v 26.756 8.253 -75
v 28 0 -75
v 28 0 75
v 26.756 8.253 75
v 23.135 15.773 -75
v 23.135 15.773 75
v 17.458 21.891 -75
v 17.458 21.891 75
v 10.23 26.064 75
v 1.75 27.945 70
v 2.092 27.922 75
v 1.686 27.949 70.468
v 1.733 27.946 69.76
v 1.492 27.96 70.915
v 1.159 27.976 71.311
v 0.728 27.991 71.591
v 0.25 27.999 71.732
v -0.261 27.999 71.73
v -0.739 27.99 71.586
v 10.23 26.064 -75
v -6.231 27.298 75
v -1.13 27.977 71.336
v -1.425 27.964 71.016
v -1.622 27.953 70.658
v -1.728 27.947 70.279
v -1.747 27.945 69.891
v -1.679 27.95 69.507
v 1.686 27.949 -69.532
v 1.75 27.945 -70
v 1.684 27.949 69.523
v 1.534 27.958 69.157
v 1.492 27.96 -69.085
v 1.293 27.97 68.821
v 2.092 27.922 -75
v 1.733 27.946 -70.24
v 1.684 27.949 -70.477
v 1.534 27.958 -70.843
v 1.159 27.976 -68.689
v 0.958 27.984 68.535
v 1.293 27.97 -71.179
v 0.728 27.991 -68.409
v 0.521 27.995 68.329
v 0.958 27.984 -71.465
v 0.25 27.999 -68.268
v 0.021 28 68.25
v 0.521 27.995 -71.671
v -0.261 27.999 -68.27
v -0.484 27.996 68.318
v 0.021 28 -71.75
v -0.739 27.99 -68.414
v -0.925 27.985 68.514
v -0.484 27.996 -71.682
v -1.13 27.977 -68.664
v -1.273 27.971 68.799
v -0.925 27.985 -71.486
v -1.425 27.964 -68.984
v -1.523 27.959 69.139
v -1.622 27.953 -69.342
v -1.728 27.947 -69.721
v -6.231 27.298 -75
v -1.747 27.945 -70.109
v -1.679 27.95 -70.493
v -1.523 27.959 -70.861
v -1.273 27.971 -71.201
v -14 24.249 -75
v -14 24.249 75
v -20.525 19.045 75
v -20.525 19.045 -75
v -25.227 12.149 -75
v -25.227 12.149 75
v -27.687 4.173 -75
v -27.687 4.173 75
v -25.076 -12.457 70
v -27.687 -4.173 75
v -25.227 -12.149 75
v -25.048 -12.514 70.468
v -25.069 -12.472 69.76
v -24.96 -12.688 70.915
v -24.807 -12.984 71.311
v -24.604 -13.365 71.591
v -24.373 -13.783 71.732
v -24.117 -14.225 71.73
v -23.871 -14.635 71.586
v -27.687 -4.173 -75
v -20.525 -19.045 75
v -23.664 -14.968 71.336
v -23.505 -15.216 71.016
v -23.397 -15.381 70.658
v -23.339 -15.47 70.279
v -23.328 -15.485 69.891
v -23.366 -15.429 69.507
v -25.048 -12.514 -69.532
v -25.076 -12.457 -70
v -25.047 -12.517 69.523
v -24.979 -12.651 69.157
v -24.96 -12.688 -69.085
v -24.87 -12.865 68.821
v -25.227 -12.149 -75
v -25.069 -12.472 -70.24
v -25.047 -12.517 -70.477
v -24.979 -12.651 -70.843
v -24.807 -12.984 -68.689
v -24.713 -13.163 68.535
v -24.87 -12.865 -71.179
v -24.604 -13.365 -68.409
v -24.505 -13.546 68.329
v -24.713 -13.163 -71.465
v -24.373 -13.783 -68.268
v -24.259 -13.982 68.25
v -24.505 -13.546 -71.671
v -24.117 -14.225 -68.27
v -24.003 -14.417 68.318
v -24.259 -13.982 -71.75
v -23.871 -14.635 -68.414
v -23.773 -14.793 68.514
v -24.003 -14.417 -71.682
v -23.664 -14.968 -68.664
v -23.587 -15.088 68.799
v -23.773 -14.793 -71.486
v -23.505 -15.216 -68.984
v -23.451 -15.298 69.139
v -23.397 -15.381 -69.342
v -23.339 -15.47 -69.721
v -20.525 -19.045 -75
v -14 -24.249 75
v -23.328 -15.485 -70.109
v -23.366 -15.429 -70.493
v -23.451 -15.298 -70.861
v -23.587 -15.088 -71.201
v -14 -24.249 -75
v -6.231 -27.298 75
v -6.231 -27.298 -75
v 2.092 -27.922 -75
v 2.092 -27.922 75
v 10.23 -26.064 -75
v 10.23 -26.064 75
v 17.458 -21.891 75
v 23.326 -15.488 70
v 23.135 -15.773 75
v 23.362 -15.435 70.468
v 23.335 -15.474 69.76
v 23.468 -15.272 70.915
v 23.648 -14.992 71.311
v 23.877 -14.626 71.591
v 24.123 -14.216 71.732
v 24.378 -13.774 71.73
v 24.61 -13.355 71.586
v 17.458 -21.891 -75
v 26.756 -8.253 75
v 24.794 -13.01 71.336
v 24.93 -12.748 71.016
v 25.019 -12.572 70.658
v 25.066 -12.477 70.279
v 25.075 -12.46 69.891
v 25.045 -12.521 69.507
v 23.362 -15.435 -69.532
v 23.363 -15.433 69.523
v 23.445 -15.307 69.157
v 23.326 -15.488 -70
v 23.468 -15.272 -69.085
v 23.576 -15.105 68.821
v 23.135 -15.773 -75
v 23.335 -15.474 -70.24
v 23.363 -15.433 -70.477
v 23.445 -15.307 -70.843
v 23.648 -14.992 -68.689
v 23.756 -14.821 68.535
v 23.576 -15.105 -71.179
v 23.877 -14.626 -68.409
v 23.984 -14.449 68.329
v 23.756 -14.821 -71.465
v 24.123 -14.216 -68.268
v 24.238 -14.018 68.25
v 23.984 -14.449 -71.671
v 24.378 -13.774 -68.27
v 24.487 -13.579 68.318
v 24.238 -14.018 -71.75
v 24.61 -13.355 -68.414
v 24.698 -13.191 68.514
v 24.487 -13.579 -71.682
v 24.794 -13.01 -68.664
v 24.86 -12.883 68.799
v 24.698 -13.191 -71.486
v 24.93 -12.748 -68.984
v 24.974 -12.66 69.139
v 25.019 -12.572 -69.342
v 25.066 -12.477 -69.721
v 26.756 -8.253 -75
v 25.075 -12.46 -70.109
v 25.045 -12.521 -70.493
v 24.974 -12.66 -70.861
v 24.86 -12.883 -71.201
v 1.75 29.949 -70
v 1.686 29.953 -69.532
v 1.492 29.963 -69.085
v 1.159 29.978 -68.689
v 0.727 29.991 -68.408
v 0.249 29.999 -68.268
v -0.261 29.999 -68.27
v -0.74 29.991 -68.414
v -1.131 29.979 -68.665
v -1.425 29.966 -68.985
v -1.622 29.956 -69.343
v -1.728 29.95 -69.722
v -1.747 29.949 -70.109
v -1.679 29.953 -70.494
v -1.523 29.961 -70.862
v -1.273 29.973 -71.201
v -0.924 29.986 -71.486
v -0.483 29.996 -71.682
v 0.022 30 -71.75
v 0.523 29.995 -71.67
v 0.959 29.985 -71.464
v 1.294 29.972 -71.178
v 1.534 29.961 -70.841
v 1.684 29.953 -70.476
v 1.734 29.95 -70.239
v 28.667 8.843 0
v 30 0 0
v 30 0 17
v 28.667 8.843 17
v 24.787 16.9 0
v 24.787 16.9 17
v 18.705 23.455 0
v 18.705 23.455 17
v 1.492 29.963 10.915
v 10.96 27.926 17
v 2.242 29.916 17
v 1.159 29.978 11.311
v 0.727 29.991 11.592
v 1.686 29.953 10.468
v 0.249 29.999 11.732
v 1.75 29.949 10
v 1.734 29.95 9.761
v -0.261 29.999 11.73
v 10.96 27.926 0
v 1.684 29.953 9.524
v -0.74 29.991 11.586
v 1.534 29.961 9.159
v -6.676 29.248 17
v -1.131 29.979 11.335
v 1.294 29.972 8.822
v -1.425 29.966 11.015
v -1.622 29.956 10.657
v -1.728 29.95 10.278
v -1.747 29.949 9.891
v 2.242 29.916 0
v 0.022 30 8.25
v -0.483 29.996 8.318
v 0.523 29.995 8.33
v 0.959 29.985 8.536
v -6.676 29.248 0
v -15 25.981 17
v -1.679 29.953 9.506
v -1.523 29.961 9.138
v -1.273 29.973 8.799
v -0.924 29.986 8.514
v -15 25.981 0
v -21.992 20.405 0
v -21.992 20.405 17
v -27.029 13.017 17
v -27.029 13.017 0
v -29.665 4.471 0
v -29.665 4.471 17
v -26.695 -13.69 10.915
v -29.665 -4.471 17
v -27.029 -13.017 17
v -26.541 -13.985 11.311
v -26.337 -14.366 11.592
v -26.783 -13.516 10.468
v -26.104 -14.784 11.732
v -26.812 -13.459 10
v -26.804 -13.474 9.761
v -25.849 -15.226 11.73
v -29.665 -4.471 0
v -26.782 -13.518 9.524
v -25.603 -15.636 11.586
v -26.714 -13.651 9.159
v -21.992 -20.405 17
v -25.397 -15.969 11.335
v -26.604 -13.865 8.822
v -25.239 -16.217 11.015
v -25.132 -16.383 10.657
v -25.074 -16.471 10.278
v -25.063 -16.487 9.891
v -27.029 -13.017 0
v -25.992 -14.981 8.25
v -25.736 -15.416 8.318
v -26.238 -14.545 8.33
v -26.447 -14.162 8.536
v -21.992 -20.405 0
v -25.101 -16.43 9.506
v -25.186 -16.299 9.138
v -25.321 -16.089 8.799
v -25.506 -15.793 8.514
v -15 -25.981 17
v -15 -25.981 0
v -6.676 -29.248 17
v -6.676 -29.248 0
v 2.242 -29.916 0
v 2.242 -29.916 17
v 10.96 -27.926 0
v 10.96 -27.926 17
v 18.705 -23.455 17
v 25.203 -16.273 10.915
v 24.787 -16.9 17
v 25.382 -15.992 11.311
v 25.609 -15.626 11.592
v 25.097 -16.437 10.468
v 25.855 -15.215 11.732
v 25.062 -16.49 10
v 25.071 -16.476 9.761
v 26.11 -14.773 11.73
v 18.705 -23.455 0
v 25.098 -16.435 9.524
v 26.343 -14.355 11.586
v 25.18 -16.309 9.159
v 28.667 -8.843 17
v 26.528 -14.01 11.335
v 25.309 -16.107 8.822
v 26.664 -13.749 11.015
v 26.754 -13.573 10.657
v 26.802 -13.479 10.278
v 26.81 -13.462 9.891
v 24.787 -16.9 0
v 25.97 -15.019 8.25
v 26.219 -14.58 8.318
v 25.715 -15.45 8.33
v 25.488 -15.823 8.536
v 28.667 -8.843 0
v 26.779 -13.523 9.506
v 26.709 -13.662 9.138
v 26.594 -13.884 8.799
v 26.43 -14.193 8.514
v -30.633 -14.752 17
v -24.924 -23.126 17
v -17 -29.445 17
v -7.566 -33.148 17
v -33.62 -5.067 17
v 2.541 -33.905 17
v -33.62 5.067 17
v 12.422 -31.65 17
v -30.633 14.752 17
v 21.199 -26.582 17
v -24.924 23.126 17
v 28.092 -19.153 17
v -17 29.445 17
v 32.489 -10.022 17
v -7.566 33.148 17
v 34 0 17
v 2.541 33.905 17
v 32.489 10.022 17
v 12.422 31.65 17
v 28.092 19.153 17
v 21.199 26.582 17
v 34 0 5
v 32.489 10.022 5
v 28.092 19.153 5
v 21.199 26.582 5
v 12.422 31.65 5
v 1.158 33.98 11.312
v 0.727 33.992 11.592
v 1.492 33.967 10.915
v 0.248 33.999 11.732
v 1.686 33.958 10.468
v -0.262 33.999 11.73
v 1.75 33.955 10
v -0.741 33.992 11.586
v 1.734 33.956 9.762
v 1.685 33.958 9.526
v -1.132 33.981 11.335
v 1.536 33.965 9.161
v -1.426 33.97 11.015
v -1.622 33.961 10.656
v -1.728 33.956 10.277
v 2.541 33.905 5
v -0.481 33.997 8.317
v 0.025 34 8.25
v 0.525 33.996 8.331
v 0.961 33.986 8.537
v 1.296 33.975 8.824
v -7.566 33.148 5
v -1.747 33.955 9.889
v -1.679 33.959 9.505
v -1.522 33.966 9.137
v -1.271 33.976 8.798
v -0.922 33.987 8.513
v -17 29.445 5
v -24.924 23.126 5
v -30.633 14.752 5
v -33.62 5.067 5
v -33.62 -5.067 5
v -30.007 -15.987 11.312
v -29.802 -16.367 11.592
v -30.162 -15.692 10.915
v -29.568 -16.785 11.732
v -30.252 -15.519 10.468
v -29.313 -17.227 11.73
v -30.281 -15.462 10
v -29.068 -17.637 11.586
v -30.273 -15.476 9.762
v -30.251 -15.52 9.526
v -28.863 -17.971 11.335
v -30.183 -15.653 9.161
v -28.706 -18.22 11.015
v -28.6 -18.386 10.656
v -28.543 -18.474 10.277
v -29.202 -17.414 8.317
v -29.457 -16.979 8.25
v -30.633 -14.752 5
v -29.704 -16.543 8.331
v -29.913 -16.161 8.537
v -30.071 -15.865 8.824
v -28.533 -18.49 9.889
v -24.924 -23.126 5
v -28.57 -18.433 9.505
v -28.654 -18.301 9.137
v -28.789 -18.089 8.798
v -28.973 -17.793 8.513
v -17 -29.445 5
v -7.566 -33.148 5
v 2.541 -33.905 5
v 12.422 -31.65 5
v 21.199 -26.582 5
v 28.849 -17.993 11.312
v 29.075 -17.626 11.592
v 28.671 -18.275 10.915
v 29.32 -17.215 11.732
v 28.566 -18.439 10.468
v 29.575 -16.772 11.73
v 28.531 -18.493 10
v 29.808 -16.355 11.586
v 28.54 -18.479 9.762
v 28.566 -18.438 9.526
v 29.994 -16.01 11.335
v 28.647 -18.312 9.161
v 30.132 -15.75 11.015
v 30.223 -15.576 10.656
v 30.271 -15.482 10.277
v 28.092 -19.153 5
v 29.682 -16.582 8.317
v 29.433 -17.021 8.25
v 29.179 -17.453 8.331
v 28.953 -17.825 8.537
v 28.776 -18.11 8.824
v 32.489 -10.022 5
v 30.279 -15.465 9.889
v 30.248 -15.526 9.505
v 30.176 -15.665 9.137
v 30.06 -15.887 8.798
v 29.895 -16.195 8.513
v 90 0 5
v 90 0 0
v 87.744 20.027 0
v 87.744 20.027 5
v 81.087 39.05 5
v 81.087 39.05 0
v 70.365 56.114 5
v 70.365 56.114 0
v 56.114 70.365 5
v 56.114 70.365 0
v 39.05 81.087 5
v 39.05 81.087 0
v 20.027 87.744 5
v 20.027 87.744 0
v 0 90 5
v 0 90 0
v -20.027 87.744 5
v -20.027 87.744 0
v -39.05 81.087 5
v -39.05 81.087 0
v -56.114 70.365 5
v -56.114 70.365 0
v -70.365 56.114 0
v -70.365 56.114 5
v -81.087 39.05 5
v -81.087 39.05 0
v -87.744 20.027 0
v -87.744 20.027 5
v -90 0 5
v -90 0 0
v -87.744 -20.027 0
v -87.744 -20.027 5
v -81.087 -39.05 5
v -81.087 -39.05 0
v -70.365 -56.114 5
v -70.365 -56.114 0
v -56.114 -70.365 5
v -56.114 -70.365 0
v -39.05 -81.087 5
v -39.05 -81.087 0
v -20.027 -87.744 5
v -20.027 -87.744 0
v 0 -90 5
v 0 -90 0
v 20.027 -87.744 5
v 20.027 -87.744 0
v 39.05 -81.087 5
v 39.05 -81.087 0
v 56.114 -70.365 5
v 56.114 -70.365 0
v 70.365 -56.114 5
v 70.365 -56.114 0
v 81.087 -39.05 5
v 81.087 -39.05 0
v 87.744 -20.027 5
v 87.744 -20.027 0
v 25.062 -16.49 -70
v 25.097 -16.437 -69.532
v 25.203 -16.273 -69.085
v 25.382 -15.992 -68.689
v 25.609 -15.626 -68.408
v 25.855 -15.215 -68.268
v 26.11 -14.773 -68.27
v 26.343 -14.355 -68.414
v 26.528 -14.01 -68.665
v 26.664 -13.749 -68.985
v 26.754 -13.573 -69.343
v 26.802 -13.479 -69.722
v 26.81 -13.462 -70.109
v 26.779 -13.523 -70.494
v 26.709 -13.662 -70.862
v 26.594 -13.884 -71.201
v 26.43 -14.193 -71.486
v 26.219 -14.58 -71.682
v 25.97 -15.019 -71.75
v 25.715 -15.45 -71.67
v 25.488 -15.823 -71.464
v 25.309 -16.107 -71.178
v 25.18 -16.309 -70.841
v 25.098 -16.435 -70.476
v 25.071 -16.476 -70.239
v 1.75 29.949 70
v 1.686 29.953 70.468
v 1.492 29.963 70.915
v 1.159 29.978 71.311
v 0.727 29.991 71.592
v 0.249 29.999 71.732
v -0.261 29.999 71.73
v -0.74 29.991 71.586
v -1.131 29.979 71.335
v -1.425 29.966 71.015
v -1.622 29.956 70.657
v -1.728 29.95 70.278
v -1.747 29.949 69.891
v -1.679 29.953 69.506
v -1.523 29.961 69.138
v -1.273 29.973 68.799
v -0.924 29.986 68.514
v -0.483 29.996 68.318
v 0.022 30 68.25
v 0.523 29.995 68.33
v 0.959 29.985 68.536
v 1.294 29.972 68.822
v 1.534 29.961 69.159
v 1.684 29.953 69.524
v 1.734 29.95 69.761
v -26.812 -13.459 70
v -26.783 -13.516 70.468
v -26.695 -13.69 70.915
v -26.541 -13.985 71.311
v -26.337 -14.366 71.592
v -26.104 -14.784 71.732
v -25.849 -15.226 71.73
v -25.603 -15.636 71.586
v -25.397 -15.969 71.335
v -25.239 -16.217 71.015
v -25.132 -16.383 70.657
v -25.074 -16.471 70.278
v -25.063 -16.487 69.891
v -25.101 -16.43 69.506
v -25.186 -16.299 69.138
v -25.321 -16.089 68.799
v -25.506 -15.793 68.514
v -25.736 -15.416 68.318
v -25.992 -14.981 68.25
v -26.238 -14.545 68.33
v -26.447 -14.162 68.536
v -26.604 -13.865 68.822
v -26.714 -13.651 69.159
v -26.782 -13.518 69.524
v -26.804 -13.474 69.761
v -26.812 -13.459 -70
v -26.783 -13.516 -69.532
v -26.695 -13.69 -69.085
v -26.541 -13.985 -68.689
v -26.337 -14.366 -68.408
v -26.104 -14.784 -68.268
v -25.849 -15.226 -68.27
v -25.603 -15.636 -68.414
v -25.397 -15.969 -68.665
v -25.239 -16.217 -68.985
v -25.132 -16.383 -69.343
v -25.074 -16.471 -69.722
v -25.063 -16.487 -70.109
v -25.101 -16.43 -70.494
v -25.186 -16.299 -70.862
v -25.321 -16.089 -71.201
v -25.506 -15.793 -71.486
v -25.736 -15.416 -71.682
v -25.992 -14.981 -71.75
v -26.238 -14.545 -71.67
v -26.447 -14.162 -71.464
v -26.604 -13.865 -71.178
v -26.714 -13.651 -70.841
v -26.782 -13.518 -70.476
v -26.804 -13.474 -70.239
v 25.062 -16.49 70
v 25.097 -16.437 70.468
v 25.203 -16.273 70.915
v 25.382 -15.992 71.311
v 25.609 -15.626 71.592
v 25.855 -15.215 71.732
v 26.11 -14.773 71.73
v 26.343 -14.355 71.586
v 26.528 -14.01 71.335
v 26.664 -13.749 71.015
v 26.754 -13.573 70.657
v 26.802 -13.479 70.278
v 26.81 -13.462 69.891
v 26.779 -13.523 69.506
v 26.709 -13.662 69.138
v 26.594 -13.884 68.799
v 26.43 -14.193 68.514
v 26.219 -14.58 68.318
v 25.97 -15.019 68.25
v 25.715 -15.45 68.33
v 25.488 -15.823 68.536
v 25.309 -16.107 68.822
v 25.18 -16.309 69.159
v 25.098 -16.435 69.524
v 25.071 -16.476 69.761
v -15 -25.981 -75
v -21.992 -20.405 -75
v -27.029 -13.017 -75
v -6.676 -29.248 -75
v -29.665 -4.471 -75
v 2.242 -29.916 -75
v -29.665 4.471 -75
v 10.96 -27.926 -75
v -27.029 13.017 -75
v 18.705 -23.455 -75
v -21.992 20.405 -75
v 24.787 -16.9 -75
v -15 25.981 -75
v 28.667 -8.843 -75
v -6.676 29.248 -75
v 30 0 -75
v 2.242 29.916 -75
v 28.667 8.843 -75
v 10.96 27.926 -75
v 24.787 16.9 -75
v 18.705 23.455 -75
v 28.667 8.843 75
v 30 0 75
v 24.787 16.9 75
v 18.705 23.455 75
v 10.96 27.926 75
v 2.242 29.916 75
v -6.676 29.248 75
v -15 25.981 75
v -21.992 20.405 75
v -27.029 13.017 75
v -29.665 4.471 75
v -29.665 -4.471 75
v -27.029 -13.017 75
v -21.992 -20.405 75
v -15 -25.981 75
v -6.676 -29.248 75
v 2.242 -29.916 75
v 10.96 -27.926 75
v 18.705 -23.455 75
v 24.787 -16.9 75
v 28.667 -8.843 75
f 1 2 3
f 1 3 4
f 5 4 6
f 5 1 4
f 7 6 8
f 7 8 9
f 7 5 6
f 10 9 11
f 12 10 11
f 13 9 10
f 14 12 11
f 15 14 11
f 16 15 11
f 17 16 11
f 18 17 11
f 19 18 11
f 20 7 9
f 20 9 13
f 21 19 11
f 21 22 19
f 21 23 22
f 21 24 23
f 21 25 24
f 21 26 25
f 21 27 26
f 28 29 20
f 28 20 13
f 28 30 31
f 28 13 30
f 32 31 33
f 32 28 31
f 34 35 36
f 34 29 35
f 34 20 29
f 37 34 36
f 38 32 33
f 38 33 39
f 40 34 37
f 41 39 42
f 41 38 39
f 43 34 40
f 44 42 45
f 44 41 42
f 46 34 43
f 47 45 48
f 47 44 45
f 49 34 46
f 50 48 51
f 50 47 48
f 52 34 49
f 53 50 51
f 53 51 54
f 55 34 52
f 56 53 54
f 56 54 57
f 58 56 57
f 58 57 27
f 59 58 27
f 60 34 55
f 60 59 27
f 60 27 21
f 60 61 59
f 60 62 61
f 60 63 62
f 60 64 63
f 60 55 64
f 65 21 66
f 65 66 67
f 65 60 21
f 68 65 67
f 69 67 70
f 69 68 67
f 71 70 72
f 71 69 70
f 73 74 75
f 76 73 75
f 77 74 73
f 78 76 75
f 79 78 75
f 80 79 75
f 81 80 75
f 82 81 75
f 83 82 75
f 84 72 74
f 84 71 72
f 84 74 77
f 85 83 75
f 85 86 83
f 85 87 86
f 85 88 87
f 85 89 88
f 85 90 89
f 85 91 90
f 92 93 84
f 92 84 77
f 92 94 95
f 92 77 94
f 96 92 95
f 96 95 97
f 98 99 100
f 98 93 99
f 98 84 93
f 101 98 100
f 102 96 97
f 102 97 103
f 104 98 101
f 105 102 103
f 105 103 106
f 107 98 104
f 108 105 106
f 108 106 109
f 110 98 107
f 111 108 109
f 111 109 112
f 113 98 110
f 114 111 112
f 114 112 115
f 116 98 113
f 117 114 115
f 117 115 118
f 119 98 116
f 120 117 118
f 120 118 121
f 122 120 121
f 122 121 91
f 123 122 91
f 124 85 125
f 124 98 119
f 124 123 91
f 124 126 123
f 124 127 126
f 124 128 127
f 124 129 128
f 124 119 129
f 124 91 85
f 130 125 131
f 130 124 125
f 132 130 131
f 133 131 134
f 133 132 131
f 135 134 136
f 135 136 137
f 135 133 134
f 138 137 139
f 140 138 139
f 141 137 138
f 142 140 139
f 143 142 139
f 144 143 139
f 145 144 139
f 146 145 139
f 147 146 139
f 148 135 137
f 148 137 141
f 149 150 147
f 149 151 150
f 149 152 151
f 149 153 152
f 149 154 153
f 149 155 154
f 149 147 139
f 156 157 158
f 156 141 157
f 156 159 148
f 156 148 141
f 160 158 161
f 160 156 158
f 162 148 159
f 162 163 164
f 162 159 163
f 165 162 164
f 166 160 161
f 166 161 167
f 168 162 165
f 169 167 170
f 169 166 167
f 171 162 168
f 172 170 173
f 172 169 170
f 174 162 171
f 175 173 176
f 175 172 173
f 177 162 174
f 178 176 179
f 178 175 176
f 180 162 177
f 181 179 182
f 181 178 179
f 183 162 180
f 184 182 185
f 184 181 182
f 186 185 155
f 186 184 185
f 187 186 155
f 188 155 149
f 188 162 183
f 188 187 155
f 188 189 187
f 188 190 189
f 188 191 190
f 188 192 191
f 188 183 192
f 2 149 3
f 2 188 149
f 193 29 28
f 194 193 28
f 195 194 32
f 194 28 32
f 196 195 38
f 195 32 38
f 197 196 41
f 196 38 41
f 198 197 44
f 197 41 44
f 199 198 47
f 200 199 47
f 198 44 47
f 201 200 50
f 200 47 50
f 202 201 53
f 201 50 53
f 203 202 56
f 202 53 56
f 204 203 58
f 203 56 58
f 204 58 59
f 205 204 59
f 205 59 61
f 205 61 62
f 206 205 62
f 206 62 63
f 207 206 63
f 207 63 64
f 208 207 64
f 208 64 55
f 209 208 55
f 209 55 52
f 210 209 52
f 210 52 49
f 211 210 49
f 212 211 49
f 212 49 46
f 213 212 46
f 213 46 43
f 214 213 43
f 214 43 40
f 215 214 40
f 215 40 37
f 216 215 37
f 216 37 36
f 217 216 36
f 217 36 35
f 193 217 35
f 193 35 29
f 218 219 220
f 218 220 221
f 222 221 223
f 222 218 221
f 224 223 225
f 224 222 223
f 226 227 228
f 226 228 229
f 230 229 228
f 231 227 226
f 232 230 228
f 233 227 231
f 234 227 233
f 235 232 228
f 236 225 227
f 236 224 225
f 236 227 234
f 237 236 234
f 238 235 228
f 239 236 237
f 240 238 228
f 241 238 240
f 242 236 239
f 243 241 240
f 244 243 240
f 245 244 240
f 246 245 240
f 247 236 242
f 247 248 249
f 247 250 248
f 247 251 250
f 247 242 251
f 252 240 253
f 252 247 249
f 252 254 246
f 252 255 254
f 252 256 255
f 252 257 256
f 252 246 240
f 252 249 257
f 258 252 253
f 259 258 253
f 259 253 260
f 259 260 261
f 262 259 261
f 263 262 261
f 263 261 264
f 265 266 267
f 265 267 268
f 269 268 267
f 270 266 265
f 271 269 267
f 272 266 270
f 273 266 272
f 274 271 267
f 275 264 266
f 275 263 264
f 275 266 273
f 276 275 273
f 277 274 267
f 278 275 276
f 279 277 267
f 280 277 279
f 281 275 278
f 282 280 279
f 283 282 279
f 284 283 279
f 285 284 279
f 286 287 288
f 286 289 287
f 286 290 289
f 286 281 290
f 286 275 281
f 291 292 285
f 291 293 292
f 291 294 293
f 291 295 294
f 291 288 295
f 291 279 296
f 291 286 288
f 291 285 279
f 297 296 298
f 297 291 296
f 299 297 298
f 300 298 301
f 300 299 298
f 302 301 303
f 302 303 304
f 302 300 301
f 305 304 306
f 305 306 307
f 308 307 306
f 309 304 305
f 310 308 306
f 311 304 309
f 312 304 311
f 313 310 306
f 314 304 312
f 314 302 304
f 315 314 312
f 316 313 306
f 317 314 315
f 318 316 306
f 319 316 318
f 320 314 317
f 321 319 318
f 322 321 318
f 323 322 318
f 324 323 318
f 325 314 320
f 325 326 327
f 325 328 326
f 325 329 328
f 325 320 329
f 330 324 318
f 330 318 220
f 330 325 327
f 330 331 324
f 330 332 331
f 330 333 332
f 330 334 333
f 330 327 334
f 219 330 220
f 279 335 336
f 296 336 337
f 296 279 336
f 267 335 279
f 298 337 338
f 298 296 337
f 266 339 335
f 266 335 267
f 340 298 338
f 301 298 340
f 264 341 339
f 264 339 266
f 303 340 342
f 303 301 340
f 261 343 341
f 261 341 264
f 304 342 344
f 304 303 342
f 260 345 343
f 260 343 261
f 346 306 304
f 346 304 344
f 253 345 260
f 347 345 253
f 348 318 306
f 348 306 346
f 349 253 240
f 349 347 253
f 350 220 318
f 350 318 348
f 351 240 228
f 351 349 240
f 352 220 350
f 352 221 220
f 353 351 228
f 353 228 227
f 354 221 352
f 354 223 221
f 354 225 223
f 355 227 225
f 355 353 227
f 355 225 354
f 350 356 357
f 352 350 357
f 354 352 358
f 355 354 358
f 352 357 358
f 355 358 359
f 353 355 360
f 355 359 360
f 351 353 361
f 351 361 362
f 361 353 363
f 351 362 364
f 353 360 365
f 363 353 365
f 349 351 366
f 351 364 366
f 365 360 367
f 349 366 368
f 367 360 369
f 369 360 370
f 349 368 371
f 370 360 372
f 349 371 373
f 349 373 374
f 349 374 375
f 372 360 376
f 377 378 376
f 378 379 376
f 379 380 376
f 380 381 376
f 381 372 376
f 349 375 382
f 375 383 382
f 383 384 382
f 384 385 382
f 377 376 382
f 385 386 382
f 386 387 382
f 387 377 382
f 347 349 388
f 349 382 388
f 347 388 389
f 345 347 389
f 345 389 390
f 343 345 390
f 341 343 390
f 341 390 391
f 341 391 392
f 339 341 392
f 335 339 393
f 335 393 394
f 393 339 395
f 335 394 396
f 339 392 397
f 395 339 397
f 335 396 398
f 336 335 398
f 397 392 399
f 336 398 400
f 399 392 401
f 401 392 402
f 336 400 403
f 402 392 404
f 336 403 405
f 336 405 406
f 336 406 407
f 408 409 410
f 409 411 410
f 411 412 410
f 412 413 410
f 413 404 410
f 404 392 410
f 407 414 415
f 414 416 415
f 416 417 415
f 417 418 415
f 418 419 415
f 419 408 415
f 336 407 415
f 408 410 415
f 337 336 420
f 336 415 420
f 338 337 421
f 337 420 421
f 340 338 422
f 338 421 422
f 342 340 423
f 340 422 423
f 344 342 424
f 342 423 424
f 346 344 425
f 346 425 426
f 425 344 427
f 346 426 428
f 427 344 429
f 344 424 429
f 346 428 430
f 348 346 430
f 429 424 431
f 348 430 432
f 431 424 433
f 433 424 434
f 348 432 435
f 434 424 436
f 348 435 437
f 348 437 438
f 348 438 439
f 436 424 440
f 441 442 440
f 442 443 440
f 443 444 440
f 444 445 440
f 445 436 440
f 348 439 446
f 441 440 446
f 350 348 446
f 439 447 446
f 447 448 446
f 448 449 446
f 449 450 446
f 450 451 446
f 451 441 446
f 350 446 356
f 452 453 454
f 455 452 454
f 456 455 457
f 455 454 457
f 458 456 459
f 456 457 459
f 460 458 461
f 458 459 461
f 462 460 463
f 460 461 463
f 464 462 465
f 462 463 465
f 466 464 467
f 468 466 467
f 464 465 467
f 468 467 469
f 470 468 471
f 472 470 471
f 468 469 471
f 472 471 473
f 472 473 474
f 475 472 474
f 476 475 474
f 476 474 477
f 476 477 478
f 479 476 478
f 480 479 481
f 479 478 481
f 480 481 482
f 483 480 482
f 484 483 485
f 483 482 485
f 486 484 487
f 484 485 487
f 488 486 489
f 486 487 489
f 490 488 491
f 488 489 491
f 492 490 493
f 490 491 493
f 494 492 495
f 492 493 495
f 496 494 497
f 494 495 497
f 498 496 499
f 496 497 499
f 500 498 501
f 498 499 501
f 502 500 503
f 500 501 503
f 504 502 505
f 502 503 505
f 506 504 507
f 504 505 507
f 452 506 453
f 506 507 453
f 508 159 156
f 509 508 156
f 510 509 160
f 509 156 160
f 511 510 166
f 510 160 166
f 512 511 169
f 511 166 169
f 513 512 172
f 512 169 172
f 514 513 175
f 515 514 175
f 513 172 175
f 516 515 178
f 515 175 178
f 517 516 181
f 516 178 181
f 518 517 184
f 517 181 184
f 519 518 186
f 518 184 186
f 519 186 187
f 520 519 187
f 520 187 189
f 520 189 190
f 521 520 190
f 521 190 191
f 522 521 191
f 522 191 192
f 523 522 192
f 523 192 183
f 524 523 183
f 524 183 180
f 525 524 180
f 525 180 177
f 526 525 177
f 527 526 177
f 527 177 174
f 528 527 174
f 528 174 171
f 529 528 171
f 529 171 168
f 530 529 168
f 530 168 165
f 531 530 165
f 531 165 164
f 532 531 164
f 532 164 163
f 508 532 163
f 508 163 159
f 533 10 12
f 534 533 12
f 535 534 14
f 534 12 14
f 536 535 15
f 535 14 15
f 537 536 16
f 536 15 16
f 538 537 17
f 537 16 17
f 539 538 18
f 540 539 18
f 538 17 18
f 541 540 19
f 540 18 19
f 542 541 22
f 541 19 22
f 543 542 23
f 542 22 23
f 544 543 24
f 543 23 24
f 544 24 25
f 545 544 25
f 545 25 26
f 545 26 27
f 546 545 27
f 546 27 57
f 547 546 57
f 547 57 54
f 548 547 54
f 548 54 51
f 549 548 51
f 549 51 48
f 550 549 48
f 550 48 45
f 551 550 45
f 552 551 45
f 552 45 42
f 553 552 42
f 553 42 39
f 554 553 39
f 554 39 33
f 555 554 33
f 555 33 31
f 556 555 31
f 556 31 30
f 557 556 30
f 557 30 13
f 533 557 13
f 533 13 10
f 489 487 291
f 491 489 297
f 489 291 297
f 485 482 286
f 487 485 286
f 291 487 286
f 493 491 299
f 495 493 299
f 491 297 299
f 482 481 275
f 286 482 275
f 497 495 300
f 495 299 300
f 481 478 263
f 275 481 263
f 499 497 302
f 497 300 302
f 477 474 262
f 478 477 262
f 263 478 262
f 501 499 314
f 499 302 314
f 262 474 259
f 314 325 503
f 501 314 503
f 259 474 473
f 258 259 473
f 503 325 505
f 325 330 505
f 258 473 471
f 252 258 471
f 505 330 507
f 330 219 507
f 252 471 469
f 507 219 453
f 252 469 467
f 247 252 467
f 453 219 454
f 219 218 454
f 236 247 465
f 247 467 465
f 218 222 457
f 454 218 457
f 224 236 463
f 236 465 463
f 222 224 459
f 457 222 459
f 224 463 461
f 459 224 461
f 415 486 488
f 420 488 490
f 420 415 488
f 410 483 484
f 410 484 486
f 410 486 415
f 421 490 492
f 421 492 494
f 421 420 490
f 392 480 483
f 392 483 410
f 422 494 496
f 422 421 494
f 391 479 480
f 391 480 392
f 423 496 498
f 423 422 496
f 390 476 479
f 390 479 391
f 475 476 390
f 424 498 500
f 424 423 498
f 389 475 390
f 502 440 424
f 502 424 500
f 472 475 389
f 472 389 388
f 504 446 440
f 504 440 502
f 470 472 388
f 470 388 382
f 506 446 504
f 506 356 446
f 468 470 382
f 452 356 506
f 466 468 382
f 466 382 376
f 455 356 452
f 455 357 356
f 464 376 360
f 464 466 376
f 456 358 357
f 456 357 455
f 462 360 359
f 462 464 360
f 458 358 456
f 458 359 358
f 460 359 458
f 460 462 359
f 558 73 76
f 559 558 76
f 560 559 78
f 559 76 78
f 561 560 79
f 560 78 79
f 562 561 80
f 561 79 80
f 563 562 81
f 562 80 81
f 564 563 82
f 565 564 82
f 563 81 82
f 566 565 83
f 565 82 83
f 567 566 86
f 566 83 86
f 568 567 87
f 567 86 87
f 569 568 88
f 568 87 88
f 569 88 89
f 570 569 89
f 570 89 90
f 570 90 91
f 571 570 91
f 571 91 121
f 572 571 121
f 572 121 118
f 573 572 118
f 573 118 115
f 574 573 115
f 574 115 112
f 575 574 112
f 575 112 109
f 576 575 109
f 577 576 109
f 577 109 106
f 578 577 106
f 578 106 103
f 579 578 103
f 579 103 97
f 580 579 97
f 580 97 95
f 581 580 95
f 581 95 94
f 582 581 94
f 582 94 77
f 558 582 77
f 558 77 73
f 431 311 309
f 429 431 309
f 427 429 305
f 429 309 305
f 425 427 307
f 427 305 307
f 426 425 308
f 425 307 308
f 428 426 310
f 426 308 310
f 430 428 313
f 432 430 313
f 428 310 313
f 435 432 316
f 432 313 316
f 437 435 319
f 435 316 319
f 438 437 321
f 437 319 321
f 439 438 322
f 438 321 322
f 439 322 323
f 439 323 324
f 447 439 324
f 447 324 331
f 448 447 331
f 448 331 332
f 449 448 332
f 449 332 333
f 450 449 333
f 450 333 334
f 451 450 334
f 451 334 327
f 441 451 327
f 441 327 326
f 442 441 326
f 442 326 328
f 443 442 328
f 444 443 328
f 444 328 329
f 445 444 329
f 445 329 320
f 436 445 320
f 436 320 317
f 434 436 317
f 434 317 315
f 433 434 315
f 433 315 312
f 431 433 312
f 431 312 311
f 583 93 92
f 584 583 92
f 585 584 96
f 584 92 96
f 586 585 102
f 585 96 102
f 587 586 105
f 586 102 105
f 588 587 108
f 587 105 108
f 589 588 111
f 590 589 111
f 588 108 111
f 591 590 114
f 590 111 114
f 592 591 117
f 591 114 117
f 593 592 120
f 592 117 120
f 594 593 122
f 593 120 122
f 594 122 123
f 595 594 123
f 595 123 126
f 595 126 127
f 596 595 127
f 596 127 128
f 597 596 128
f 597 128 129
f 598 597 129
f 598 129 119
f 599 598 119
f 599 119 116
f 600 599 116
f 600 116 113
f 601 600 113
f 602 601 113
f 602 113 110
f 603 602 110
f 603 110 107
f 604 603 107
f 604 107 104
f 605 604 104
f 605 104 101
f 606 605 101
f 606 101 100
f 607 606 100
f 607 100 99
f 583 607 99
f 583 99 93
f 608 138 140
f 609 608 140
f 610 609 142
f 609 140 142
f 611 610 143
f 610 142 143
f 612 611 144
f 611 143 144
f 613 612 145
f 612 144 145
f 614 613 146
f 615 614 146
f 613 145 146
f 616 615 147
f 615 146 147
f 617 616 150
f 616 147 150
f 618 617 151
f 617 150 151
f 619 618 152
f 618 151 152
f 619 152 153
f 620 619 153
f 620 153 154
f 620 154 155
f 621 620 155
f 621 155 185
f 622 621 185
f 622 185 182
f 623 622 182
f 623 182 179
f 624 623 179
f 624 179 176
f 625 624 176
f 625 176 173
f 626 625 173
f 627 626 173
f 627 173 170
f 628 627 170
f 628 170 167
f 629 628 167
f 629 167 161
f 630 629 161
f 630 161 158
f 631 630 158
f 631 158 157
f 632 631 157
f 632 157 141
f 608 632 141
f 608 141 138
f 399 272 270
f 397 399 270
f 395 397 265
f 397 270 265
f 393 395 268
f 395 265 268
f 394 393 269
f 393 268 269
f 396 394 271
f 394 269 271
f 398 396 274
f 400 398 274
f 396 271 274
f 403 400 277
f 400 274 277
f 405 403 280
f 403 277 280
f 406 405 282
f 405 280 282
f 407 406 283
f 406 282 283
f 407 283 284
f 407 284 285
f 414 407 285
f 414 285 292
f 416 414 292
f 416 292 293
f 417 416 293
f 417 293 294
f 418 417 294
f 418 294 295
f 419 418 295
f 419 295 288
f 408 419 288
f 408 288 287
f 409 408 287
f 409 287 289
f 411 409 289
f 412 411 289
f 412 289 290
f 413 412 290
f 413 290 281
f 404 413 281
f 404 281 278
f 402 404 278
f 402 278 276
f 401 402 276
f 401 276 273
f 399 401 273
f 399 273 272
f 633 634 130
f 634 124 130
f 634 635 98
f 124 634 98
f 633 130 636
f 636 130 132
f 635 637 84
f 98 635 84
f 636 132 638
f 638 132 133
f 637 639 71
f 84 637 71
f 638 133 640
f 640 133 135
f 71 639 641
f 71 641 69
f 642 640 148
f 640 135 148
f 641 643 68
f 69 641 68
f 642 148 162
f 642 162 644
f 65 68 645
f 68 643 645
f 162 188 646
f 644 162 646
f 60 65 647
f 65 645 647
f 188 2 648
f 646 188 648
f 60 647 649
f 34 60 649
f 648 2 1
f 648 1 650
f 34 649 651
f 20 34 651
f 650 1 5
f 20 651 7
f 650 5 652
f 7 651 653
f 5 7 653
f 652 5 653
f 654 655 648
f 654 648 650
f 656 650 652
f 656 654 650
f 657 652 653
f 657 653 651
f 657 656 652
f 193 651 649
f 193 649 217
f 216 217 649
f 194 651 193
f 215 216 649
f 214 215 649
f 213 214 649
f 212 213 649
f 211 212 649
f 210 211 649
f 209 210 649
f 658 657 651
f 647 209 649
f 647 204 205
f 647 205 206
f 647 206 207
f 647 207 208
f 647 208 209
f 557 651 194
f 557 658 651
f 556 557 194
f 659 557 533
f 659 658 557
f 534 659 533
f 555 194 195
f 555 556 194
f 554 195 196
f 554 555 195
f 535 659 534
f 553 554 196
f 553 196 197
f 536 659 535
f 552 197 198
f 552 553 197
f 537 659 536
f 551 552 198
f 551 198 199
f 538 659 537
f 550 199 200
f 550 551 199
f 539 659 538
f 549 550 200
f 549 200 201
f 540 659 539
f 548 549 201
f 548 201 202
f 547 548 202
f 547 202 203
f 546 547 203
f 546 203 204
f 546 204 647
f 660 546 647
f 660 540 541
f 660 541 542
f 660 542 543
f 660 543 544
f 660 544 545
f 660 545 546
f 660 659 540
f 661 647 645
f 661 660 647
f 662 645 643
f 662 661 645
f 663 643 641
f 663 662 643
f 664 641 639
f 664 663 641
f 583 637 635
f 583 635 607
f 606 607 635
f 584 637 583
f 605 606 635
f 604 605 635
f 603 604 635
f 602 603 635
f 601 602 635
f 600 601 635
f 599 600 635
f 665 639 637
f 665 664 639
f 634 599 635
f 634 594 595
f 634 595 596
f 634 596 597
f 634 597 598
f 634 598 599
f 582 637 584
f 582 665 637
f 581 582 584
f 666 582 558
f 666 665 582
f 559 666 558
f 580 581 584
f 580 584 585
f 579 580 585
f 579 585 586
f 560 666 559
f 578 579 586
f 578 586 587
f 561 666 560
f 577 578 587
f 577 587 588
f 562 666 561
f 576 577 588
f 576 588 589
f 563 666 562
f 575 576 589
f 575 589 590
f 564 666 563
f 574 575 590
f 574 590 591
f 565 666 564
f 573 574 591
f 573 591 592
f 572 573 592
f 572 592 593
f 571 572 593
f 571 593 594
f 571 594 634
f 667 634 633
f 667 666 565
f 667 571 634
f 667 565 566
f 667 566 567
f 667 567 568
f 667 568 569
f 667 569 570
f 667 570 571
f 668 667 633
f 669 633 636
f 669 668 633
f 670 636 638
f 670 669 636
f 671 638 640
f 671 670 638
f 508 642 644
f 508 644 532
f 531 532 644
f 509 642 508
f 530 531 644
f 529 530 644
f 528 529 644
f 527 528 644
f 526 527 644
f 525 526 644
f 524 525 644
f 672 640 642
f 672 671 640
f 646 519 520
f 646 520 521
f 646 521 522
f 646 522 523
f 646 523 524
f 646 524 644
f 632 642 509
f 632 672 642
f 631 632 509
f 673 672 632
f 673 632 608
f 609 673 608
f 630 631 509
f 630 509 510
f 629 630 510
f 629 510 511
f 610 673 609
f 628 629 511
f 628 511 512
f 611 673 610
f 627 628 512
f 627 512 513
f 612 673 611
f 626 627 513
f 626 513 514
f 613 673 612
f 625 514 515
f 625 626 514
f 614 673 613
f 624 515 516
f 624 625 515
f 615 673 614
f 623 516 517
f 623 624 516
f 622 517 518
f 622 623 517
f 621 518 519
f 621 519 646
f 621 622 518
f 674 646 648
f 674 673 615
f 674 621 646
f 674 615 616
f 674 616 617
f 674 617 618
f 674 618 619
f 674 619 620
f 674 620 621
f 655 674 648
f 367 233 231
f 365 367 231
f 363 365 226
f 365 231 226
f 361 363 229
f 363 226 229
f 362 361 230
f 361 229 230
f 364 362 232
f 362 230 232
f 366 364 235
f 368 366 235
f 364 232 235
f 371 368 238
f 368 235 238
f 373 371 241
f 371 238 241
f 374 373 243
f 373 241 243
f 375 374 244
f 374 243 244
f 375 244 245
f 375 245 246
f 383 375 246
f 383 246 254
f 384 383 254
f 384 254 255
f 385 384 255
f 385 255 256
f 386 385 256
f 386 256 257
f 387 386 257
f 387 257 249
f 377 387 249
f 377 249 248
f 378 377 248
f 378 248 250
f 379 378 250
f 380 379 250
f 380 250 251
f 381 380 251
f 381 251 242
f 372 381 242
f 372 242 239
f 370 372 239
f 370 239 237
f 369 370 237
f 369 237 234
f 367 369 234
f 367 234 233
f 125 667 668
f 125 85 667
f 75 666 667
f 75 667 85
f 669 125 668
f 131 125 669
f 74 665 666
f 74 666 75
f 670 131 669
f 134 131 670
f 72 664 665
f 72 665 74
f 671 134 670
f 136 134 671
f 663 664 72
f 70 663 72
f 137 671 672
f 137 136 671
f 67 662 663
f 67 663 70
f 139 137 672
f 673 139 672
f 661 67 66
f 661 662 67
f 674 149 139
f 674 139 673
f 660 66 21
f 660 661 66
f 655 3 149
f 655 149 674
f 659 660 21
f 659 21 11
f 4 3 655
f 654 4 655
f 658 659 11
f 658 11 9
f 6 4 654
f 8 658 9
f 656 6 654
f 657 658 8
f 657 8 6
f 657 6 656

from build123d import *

# Parameters (mm, degrees)
SKETCH_R              = 90
SKETCH_R_2            = 30
PAD_DEPTH             = 5
SKETCH001_R           = 34
SKETCH001_R_2         = 30
PAD001_DEPTH          = 12
SKETCH002_R           = 1.75
POCKET_DEPTH          = 600.251919
POLARPATTERN_COUNT    = 3
SKETCH003_R           = 30
SKETCH003_R_2         = 28
PAD002_DEPTH          = 75
SKETCH004_R           = 1.75
POCKET001_DEPTH       = 374.674759
POLARPATTERN001_COUNT = 3


with BuildPart() as side:
    # Sketch → Pad (new body)
    with BuildSketch(Plane.XY):
        Circle(SKETCH_R)
        Circle(SKETCH_R_2, mode=Mode.SUBTRACT)
    extrude(amount=PAD_DEPTH)

    # Sketch001 (on Face4 of Pad) → Pad001 (join)
    with BuildSketch(Plane.XY.offset(5)):
        Circle(SKETCH001_R)
        Circle(SKETCH001_R_2, mode=Mode.SUBTRACT)
    extrude(amount=PAD001_DEPTH)

    # Sketch002 → Pocket (cut, through all)
    with BuildSketch(Plane.XZ):
        with Locations((0, 10)):
            Circle(SKETCH002_R)
    pocket = extrude(amount=-POCKET_DEPTH, mode=Mode.SUBTRACT)

    # PolarPattern: Pocket ×3 about axis
    polarpattern_axis = Axis((0, 0, 0), (0, 0, 1))
    for i in range(1, POLARPATTERN_COUNT):
        add(pocket.rotate(polarpattern_axis, i * 360 / POLARPATTERN_COUNT), mode=Mode.SUBTRACT)


with BuildPart() as roll:
    # Sketch003 → Pad002 (new body, symmetric)
    with BuildSketch(Plane.XY):
        Circle(SKETCH003_R)
        Circle(SKETCH003_R_2, mode=Mode.SUBTRACT)
    extrude(amount=PAD002_DEPTH, both=True)

    # Sketch004 → Pocket001 (cut, through all)
    with BuildSketch(Plane.XZ):
        with Locations((0, -70)):
            Circle(SKETCH004_R)
        with Locations((0, 70)):
            Circle(SKETCH004_R)
    pocket001 = extrude(amount=-POCKET001_DEPTH, mode=Mode.SUBTRACT)

    # PolarPattern001: Pocket001 ×3 about axis
    polarpattern001_axis = Axis((0, 0, 0), (0, 0, 1))
    for i in range(1, POLARPATTERN001_COUNT):
        add(pocket001.rotate(polarpattern001_axis, i * 360 / POLARPATTERN001_COUNT), mode=Mode.SUBTRACT)


solid = Compound([side.part, roll.part])
